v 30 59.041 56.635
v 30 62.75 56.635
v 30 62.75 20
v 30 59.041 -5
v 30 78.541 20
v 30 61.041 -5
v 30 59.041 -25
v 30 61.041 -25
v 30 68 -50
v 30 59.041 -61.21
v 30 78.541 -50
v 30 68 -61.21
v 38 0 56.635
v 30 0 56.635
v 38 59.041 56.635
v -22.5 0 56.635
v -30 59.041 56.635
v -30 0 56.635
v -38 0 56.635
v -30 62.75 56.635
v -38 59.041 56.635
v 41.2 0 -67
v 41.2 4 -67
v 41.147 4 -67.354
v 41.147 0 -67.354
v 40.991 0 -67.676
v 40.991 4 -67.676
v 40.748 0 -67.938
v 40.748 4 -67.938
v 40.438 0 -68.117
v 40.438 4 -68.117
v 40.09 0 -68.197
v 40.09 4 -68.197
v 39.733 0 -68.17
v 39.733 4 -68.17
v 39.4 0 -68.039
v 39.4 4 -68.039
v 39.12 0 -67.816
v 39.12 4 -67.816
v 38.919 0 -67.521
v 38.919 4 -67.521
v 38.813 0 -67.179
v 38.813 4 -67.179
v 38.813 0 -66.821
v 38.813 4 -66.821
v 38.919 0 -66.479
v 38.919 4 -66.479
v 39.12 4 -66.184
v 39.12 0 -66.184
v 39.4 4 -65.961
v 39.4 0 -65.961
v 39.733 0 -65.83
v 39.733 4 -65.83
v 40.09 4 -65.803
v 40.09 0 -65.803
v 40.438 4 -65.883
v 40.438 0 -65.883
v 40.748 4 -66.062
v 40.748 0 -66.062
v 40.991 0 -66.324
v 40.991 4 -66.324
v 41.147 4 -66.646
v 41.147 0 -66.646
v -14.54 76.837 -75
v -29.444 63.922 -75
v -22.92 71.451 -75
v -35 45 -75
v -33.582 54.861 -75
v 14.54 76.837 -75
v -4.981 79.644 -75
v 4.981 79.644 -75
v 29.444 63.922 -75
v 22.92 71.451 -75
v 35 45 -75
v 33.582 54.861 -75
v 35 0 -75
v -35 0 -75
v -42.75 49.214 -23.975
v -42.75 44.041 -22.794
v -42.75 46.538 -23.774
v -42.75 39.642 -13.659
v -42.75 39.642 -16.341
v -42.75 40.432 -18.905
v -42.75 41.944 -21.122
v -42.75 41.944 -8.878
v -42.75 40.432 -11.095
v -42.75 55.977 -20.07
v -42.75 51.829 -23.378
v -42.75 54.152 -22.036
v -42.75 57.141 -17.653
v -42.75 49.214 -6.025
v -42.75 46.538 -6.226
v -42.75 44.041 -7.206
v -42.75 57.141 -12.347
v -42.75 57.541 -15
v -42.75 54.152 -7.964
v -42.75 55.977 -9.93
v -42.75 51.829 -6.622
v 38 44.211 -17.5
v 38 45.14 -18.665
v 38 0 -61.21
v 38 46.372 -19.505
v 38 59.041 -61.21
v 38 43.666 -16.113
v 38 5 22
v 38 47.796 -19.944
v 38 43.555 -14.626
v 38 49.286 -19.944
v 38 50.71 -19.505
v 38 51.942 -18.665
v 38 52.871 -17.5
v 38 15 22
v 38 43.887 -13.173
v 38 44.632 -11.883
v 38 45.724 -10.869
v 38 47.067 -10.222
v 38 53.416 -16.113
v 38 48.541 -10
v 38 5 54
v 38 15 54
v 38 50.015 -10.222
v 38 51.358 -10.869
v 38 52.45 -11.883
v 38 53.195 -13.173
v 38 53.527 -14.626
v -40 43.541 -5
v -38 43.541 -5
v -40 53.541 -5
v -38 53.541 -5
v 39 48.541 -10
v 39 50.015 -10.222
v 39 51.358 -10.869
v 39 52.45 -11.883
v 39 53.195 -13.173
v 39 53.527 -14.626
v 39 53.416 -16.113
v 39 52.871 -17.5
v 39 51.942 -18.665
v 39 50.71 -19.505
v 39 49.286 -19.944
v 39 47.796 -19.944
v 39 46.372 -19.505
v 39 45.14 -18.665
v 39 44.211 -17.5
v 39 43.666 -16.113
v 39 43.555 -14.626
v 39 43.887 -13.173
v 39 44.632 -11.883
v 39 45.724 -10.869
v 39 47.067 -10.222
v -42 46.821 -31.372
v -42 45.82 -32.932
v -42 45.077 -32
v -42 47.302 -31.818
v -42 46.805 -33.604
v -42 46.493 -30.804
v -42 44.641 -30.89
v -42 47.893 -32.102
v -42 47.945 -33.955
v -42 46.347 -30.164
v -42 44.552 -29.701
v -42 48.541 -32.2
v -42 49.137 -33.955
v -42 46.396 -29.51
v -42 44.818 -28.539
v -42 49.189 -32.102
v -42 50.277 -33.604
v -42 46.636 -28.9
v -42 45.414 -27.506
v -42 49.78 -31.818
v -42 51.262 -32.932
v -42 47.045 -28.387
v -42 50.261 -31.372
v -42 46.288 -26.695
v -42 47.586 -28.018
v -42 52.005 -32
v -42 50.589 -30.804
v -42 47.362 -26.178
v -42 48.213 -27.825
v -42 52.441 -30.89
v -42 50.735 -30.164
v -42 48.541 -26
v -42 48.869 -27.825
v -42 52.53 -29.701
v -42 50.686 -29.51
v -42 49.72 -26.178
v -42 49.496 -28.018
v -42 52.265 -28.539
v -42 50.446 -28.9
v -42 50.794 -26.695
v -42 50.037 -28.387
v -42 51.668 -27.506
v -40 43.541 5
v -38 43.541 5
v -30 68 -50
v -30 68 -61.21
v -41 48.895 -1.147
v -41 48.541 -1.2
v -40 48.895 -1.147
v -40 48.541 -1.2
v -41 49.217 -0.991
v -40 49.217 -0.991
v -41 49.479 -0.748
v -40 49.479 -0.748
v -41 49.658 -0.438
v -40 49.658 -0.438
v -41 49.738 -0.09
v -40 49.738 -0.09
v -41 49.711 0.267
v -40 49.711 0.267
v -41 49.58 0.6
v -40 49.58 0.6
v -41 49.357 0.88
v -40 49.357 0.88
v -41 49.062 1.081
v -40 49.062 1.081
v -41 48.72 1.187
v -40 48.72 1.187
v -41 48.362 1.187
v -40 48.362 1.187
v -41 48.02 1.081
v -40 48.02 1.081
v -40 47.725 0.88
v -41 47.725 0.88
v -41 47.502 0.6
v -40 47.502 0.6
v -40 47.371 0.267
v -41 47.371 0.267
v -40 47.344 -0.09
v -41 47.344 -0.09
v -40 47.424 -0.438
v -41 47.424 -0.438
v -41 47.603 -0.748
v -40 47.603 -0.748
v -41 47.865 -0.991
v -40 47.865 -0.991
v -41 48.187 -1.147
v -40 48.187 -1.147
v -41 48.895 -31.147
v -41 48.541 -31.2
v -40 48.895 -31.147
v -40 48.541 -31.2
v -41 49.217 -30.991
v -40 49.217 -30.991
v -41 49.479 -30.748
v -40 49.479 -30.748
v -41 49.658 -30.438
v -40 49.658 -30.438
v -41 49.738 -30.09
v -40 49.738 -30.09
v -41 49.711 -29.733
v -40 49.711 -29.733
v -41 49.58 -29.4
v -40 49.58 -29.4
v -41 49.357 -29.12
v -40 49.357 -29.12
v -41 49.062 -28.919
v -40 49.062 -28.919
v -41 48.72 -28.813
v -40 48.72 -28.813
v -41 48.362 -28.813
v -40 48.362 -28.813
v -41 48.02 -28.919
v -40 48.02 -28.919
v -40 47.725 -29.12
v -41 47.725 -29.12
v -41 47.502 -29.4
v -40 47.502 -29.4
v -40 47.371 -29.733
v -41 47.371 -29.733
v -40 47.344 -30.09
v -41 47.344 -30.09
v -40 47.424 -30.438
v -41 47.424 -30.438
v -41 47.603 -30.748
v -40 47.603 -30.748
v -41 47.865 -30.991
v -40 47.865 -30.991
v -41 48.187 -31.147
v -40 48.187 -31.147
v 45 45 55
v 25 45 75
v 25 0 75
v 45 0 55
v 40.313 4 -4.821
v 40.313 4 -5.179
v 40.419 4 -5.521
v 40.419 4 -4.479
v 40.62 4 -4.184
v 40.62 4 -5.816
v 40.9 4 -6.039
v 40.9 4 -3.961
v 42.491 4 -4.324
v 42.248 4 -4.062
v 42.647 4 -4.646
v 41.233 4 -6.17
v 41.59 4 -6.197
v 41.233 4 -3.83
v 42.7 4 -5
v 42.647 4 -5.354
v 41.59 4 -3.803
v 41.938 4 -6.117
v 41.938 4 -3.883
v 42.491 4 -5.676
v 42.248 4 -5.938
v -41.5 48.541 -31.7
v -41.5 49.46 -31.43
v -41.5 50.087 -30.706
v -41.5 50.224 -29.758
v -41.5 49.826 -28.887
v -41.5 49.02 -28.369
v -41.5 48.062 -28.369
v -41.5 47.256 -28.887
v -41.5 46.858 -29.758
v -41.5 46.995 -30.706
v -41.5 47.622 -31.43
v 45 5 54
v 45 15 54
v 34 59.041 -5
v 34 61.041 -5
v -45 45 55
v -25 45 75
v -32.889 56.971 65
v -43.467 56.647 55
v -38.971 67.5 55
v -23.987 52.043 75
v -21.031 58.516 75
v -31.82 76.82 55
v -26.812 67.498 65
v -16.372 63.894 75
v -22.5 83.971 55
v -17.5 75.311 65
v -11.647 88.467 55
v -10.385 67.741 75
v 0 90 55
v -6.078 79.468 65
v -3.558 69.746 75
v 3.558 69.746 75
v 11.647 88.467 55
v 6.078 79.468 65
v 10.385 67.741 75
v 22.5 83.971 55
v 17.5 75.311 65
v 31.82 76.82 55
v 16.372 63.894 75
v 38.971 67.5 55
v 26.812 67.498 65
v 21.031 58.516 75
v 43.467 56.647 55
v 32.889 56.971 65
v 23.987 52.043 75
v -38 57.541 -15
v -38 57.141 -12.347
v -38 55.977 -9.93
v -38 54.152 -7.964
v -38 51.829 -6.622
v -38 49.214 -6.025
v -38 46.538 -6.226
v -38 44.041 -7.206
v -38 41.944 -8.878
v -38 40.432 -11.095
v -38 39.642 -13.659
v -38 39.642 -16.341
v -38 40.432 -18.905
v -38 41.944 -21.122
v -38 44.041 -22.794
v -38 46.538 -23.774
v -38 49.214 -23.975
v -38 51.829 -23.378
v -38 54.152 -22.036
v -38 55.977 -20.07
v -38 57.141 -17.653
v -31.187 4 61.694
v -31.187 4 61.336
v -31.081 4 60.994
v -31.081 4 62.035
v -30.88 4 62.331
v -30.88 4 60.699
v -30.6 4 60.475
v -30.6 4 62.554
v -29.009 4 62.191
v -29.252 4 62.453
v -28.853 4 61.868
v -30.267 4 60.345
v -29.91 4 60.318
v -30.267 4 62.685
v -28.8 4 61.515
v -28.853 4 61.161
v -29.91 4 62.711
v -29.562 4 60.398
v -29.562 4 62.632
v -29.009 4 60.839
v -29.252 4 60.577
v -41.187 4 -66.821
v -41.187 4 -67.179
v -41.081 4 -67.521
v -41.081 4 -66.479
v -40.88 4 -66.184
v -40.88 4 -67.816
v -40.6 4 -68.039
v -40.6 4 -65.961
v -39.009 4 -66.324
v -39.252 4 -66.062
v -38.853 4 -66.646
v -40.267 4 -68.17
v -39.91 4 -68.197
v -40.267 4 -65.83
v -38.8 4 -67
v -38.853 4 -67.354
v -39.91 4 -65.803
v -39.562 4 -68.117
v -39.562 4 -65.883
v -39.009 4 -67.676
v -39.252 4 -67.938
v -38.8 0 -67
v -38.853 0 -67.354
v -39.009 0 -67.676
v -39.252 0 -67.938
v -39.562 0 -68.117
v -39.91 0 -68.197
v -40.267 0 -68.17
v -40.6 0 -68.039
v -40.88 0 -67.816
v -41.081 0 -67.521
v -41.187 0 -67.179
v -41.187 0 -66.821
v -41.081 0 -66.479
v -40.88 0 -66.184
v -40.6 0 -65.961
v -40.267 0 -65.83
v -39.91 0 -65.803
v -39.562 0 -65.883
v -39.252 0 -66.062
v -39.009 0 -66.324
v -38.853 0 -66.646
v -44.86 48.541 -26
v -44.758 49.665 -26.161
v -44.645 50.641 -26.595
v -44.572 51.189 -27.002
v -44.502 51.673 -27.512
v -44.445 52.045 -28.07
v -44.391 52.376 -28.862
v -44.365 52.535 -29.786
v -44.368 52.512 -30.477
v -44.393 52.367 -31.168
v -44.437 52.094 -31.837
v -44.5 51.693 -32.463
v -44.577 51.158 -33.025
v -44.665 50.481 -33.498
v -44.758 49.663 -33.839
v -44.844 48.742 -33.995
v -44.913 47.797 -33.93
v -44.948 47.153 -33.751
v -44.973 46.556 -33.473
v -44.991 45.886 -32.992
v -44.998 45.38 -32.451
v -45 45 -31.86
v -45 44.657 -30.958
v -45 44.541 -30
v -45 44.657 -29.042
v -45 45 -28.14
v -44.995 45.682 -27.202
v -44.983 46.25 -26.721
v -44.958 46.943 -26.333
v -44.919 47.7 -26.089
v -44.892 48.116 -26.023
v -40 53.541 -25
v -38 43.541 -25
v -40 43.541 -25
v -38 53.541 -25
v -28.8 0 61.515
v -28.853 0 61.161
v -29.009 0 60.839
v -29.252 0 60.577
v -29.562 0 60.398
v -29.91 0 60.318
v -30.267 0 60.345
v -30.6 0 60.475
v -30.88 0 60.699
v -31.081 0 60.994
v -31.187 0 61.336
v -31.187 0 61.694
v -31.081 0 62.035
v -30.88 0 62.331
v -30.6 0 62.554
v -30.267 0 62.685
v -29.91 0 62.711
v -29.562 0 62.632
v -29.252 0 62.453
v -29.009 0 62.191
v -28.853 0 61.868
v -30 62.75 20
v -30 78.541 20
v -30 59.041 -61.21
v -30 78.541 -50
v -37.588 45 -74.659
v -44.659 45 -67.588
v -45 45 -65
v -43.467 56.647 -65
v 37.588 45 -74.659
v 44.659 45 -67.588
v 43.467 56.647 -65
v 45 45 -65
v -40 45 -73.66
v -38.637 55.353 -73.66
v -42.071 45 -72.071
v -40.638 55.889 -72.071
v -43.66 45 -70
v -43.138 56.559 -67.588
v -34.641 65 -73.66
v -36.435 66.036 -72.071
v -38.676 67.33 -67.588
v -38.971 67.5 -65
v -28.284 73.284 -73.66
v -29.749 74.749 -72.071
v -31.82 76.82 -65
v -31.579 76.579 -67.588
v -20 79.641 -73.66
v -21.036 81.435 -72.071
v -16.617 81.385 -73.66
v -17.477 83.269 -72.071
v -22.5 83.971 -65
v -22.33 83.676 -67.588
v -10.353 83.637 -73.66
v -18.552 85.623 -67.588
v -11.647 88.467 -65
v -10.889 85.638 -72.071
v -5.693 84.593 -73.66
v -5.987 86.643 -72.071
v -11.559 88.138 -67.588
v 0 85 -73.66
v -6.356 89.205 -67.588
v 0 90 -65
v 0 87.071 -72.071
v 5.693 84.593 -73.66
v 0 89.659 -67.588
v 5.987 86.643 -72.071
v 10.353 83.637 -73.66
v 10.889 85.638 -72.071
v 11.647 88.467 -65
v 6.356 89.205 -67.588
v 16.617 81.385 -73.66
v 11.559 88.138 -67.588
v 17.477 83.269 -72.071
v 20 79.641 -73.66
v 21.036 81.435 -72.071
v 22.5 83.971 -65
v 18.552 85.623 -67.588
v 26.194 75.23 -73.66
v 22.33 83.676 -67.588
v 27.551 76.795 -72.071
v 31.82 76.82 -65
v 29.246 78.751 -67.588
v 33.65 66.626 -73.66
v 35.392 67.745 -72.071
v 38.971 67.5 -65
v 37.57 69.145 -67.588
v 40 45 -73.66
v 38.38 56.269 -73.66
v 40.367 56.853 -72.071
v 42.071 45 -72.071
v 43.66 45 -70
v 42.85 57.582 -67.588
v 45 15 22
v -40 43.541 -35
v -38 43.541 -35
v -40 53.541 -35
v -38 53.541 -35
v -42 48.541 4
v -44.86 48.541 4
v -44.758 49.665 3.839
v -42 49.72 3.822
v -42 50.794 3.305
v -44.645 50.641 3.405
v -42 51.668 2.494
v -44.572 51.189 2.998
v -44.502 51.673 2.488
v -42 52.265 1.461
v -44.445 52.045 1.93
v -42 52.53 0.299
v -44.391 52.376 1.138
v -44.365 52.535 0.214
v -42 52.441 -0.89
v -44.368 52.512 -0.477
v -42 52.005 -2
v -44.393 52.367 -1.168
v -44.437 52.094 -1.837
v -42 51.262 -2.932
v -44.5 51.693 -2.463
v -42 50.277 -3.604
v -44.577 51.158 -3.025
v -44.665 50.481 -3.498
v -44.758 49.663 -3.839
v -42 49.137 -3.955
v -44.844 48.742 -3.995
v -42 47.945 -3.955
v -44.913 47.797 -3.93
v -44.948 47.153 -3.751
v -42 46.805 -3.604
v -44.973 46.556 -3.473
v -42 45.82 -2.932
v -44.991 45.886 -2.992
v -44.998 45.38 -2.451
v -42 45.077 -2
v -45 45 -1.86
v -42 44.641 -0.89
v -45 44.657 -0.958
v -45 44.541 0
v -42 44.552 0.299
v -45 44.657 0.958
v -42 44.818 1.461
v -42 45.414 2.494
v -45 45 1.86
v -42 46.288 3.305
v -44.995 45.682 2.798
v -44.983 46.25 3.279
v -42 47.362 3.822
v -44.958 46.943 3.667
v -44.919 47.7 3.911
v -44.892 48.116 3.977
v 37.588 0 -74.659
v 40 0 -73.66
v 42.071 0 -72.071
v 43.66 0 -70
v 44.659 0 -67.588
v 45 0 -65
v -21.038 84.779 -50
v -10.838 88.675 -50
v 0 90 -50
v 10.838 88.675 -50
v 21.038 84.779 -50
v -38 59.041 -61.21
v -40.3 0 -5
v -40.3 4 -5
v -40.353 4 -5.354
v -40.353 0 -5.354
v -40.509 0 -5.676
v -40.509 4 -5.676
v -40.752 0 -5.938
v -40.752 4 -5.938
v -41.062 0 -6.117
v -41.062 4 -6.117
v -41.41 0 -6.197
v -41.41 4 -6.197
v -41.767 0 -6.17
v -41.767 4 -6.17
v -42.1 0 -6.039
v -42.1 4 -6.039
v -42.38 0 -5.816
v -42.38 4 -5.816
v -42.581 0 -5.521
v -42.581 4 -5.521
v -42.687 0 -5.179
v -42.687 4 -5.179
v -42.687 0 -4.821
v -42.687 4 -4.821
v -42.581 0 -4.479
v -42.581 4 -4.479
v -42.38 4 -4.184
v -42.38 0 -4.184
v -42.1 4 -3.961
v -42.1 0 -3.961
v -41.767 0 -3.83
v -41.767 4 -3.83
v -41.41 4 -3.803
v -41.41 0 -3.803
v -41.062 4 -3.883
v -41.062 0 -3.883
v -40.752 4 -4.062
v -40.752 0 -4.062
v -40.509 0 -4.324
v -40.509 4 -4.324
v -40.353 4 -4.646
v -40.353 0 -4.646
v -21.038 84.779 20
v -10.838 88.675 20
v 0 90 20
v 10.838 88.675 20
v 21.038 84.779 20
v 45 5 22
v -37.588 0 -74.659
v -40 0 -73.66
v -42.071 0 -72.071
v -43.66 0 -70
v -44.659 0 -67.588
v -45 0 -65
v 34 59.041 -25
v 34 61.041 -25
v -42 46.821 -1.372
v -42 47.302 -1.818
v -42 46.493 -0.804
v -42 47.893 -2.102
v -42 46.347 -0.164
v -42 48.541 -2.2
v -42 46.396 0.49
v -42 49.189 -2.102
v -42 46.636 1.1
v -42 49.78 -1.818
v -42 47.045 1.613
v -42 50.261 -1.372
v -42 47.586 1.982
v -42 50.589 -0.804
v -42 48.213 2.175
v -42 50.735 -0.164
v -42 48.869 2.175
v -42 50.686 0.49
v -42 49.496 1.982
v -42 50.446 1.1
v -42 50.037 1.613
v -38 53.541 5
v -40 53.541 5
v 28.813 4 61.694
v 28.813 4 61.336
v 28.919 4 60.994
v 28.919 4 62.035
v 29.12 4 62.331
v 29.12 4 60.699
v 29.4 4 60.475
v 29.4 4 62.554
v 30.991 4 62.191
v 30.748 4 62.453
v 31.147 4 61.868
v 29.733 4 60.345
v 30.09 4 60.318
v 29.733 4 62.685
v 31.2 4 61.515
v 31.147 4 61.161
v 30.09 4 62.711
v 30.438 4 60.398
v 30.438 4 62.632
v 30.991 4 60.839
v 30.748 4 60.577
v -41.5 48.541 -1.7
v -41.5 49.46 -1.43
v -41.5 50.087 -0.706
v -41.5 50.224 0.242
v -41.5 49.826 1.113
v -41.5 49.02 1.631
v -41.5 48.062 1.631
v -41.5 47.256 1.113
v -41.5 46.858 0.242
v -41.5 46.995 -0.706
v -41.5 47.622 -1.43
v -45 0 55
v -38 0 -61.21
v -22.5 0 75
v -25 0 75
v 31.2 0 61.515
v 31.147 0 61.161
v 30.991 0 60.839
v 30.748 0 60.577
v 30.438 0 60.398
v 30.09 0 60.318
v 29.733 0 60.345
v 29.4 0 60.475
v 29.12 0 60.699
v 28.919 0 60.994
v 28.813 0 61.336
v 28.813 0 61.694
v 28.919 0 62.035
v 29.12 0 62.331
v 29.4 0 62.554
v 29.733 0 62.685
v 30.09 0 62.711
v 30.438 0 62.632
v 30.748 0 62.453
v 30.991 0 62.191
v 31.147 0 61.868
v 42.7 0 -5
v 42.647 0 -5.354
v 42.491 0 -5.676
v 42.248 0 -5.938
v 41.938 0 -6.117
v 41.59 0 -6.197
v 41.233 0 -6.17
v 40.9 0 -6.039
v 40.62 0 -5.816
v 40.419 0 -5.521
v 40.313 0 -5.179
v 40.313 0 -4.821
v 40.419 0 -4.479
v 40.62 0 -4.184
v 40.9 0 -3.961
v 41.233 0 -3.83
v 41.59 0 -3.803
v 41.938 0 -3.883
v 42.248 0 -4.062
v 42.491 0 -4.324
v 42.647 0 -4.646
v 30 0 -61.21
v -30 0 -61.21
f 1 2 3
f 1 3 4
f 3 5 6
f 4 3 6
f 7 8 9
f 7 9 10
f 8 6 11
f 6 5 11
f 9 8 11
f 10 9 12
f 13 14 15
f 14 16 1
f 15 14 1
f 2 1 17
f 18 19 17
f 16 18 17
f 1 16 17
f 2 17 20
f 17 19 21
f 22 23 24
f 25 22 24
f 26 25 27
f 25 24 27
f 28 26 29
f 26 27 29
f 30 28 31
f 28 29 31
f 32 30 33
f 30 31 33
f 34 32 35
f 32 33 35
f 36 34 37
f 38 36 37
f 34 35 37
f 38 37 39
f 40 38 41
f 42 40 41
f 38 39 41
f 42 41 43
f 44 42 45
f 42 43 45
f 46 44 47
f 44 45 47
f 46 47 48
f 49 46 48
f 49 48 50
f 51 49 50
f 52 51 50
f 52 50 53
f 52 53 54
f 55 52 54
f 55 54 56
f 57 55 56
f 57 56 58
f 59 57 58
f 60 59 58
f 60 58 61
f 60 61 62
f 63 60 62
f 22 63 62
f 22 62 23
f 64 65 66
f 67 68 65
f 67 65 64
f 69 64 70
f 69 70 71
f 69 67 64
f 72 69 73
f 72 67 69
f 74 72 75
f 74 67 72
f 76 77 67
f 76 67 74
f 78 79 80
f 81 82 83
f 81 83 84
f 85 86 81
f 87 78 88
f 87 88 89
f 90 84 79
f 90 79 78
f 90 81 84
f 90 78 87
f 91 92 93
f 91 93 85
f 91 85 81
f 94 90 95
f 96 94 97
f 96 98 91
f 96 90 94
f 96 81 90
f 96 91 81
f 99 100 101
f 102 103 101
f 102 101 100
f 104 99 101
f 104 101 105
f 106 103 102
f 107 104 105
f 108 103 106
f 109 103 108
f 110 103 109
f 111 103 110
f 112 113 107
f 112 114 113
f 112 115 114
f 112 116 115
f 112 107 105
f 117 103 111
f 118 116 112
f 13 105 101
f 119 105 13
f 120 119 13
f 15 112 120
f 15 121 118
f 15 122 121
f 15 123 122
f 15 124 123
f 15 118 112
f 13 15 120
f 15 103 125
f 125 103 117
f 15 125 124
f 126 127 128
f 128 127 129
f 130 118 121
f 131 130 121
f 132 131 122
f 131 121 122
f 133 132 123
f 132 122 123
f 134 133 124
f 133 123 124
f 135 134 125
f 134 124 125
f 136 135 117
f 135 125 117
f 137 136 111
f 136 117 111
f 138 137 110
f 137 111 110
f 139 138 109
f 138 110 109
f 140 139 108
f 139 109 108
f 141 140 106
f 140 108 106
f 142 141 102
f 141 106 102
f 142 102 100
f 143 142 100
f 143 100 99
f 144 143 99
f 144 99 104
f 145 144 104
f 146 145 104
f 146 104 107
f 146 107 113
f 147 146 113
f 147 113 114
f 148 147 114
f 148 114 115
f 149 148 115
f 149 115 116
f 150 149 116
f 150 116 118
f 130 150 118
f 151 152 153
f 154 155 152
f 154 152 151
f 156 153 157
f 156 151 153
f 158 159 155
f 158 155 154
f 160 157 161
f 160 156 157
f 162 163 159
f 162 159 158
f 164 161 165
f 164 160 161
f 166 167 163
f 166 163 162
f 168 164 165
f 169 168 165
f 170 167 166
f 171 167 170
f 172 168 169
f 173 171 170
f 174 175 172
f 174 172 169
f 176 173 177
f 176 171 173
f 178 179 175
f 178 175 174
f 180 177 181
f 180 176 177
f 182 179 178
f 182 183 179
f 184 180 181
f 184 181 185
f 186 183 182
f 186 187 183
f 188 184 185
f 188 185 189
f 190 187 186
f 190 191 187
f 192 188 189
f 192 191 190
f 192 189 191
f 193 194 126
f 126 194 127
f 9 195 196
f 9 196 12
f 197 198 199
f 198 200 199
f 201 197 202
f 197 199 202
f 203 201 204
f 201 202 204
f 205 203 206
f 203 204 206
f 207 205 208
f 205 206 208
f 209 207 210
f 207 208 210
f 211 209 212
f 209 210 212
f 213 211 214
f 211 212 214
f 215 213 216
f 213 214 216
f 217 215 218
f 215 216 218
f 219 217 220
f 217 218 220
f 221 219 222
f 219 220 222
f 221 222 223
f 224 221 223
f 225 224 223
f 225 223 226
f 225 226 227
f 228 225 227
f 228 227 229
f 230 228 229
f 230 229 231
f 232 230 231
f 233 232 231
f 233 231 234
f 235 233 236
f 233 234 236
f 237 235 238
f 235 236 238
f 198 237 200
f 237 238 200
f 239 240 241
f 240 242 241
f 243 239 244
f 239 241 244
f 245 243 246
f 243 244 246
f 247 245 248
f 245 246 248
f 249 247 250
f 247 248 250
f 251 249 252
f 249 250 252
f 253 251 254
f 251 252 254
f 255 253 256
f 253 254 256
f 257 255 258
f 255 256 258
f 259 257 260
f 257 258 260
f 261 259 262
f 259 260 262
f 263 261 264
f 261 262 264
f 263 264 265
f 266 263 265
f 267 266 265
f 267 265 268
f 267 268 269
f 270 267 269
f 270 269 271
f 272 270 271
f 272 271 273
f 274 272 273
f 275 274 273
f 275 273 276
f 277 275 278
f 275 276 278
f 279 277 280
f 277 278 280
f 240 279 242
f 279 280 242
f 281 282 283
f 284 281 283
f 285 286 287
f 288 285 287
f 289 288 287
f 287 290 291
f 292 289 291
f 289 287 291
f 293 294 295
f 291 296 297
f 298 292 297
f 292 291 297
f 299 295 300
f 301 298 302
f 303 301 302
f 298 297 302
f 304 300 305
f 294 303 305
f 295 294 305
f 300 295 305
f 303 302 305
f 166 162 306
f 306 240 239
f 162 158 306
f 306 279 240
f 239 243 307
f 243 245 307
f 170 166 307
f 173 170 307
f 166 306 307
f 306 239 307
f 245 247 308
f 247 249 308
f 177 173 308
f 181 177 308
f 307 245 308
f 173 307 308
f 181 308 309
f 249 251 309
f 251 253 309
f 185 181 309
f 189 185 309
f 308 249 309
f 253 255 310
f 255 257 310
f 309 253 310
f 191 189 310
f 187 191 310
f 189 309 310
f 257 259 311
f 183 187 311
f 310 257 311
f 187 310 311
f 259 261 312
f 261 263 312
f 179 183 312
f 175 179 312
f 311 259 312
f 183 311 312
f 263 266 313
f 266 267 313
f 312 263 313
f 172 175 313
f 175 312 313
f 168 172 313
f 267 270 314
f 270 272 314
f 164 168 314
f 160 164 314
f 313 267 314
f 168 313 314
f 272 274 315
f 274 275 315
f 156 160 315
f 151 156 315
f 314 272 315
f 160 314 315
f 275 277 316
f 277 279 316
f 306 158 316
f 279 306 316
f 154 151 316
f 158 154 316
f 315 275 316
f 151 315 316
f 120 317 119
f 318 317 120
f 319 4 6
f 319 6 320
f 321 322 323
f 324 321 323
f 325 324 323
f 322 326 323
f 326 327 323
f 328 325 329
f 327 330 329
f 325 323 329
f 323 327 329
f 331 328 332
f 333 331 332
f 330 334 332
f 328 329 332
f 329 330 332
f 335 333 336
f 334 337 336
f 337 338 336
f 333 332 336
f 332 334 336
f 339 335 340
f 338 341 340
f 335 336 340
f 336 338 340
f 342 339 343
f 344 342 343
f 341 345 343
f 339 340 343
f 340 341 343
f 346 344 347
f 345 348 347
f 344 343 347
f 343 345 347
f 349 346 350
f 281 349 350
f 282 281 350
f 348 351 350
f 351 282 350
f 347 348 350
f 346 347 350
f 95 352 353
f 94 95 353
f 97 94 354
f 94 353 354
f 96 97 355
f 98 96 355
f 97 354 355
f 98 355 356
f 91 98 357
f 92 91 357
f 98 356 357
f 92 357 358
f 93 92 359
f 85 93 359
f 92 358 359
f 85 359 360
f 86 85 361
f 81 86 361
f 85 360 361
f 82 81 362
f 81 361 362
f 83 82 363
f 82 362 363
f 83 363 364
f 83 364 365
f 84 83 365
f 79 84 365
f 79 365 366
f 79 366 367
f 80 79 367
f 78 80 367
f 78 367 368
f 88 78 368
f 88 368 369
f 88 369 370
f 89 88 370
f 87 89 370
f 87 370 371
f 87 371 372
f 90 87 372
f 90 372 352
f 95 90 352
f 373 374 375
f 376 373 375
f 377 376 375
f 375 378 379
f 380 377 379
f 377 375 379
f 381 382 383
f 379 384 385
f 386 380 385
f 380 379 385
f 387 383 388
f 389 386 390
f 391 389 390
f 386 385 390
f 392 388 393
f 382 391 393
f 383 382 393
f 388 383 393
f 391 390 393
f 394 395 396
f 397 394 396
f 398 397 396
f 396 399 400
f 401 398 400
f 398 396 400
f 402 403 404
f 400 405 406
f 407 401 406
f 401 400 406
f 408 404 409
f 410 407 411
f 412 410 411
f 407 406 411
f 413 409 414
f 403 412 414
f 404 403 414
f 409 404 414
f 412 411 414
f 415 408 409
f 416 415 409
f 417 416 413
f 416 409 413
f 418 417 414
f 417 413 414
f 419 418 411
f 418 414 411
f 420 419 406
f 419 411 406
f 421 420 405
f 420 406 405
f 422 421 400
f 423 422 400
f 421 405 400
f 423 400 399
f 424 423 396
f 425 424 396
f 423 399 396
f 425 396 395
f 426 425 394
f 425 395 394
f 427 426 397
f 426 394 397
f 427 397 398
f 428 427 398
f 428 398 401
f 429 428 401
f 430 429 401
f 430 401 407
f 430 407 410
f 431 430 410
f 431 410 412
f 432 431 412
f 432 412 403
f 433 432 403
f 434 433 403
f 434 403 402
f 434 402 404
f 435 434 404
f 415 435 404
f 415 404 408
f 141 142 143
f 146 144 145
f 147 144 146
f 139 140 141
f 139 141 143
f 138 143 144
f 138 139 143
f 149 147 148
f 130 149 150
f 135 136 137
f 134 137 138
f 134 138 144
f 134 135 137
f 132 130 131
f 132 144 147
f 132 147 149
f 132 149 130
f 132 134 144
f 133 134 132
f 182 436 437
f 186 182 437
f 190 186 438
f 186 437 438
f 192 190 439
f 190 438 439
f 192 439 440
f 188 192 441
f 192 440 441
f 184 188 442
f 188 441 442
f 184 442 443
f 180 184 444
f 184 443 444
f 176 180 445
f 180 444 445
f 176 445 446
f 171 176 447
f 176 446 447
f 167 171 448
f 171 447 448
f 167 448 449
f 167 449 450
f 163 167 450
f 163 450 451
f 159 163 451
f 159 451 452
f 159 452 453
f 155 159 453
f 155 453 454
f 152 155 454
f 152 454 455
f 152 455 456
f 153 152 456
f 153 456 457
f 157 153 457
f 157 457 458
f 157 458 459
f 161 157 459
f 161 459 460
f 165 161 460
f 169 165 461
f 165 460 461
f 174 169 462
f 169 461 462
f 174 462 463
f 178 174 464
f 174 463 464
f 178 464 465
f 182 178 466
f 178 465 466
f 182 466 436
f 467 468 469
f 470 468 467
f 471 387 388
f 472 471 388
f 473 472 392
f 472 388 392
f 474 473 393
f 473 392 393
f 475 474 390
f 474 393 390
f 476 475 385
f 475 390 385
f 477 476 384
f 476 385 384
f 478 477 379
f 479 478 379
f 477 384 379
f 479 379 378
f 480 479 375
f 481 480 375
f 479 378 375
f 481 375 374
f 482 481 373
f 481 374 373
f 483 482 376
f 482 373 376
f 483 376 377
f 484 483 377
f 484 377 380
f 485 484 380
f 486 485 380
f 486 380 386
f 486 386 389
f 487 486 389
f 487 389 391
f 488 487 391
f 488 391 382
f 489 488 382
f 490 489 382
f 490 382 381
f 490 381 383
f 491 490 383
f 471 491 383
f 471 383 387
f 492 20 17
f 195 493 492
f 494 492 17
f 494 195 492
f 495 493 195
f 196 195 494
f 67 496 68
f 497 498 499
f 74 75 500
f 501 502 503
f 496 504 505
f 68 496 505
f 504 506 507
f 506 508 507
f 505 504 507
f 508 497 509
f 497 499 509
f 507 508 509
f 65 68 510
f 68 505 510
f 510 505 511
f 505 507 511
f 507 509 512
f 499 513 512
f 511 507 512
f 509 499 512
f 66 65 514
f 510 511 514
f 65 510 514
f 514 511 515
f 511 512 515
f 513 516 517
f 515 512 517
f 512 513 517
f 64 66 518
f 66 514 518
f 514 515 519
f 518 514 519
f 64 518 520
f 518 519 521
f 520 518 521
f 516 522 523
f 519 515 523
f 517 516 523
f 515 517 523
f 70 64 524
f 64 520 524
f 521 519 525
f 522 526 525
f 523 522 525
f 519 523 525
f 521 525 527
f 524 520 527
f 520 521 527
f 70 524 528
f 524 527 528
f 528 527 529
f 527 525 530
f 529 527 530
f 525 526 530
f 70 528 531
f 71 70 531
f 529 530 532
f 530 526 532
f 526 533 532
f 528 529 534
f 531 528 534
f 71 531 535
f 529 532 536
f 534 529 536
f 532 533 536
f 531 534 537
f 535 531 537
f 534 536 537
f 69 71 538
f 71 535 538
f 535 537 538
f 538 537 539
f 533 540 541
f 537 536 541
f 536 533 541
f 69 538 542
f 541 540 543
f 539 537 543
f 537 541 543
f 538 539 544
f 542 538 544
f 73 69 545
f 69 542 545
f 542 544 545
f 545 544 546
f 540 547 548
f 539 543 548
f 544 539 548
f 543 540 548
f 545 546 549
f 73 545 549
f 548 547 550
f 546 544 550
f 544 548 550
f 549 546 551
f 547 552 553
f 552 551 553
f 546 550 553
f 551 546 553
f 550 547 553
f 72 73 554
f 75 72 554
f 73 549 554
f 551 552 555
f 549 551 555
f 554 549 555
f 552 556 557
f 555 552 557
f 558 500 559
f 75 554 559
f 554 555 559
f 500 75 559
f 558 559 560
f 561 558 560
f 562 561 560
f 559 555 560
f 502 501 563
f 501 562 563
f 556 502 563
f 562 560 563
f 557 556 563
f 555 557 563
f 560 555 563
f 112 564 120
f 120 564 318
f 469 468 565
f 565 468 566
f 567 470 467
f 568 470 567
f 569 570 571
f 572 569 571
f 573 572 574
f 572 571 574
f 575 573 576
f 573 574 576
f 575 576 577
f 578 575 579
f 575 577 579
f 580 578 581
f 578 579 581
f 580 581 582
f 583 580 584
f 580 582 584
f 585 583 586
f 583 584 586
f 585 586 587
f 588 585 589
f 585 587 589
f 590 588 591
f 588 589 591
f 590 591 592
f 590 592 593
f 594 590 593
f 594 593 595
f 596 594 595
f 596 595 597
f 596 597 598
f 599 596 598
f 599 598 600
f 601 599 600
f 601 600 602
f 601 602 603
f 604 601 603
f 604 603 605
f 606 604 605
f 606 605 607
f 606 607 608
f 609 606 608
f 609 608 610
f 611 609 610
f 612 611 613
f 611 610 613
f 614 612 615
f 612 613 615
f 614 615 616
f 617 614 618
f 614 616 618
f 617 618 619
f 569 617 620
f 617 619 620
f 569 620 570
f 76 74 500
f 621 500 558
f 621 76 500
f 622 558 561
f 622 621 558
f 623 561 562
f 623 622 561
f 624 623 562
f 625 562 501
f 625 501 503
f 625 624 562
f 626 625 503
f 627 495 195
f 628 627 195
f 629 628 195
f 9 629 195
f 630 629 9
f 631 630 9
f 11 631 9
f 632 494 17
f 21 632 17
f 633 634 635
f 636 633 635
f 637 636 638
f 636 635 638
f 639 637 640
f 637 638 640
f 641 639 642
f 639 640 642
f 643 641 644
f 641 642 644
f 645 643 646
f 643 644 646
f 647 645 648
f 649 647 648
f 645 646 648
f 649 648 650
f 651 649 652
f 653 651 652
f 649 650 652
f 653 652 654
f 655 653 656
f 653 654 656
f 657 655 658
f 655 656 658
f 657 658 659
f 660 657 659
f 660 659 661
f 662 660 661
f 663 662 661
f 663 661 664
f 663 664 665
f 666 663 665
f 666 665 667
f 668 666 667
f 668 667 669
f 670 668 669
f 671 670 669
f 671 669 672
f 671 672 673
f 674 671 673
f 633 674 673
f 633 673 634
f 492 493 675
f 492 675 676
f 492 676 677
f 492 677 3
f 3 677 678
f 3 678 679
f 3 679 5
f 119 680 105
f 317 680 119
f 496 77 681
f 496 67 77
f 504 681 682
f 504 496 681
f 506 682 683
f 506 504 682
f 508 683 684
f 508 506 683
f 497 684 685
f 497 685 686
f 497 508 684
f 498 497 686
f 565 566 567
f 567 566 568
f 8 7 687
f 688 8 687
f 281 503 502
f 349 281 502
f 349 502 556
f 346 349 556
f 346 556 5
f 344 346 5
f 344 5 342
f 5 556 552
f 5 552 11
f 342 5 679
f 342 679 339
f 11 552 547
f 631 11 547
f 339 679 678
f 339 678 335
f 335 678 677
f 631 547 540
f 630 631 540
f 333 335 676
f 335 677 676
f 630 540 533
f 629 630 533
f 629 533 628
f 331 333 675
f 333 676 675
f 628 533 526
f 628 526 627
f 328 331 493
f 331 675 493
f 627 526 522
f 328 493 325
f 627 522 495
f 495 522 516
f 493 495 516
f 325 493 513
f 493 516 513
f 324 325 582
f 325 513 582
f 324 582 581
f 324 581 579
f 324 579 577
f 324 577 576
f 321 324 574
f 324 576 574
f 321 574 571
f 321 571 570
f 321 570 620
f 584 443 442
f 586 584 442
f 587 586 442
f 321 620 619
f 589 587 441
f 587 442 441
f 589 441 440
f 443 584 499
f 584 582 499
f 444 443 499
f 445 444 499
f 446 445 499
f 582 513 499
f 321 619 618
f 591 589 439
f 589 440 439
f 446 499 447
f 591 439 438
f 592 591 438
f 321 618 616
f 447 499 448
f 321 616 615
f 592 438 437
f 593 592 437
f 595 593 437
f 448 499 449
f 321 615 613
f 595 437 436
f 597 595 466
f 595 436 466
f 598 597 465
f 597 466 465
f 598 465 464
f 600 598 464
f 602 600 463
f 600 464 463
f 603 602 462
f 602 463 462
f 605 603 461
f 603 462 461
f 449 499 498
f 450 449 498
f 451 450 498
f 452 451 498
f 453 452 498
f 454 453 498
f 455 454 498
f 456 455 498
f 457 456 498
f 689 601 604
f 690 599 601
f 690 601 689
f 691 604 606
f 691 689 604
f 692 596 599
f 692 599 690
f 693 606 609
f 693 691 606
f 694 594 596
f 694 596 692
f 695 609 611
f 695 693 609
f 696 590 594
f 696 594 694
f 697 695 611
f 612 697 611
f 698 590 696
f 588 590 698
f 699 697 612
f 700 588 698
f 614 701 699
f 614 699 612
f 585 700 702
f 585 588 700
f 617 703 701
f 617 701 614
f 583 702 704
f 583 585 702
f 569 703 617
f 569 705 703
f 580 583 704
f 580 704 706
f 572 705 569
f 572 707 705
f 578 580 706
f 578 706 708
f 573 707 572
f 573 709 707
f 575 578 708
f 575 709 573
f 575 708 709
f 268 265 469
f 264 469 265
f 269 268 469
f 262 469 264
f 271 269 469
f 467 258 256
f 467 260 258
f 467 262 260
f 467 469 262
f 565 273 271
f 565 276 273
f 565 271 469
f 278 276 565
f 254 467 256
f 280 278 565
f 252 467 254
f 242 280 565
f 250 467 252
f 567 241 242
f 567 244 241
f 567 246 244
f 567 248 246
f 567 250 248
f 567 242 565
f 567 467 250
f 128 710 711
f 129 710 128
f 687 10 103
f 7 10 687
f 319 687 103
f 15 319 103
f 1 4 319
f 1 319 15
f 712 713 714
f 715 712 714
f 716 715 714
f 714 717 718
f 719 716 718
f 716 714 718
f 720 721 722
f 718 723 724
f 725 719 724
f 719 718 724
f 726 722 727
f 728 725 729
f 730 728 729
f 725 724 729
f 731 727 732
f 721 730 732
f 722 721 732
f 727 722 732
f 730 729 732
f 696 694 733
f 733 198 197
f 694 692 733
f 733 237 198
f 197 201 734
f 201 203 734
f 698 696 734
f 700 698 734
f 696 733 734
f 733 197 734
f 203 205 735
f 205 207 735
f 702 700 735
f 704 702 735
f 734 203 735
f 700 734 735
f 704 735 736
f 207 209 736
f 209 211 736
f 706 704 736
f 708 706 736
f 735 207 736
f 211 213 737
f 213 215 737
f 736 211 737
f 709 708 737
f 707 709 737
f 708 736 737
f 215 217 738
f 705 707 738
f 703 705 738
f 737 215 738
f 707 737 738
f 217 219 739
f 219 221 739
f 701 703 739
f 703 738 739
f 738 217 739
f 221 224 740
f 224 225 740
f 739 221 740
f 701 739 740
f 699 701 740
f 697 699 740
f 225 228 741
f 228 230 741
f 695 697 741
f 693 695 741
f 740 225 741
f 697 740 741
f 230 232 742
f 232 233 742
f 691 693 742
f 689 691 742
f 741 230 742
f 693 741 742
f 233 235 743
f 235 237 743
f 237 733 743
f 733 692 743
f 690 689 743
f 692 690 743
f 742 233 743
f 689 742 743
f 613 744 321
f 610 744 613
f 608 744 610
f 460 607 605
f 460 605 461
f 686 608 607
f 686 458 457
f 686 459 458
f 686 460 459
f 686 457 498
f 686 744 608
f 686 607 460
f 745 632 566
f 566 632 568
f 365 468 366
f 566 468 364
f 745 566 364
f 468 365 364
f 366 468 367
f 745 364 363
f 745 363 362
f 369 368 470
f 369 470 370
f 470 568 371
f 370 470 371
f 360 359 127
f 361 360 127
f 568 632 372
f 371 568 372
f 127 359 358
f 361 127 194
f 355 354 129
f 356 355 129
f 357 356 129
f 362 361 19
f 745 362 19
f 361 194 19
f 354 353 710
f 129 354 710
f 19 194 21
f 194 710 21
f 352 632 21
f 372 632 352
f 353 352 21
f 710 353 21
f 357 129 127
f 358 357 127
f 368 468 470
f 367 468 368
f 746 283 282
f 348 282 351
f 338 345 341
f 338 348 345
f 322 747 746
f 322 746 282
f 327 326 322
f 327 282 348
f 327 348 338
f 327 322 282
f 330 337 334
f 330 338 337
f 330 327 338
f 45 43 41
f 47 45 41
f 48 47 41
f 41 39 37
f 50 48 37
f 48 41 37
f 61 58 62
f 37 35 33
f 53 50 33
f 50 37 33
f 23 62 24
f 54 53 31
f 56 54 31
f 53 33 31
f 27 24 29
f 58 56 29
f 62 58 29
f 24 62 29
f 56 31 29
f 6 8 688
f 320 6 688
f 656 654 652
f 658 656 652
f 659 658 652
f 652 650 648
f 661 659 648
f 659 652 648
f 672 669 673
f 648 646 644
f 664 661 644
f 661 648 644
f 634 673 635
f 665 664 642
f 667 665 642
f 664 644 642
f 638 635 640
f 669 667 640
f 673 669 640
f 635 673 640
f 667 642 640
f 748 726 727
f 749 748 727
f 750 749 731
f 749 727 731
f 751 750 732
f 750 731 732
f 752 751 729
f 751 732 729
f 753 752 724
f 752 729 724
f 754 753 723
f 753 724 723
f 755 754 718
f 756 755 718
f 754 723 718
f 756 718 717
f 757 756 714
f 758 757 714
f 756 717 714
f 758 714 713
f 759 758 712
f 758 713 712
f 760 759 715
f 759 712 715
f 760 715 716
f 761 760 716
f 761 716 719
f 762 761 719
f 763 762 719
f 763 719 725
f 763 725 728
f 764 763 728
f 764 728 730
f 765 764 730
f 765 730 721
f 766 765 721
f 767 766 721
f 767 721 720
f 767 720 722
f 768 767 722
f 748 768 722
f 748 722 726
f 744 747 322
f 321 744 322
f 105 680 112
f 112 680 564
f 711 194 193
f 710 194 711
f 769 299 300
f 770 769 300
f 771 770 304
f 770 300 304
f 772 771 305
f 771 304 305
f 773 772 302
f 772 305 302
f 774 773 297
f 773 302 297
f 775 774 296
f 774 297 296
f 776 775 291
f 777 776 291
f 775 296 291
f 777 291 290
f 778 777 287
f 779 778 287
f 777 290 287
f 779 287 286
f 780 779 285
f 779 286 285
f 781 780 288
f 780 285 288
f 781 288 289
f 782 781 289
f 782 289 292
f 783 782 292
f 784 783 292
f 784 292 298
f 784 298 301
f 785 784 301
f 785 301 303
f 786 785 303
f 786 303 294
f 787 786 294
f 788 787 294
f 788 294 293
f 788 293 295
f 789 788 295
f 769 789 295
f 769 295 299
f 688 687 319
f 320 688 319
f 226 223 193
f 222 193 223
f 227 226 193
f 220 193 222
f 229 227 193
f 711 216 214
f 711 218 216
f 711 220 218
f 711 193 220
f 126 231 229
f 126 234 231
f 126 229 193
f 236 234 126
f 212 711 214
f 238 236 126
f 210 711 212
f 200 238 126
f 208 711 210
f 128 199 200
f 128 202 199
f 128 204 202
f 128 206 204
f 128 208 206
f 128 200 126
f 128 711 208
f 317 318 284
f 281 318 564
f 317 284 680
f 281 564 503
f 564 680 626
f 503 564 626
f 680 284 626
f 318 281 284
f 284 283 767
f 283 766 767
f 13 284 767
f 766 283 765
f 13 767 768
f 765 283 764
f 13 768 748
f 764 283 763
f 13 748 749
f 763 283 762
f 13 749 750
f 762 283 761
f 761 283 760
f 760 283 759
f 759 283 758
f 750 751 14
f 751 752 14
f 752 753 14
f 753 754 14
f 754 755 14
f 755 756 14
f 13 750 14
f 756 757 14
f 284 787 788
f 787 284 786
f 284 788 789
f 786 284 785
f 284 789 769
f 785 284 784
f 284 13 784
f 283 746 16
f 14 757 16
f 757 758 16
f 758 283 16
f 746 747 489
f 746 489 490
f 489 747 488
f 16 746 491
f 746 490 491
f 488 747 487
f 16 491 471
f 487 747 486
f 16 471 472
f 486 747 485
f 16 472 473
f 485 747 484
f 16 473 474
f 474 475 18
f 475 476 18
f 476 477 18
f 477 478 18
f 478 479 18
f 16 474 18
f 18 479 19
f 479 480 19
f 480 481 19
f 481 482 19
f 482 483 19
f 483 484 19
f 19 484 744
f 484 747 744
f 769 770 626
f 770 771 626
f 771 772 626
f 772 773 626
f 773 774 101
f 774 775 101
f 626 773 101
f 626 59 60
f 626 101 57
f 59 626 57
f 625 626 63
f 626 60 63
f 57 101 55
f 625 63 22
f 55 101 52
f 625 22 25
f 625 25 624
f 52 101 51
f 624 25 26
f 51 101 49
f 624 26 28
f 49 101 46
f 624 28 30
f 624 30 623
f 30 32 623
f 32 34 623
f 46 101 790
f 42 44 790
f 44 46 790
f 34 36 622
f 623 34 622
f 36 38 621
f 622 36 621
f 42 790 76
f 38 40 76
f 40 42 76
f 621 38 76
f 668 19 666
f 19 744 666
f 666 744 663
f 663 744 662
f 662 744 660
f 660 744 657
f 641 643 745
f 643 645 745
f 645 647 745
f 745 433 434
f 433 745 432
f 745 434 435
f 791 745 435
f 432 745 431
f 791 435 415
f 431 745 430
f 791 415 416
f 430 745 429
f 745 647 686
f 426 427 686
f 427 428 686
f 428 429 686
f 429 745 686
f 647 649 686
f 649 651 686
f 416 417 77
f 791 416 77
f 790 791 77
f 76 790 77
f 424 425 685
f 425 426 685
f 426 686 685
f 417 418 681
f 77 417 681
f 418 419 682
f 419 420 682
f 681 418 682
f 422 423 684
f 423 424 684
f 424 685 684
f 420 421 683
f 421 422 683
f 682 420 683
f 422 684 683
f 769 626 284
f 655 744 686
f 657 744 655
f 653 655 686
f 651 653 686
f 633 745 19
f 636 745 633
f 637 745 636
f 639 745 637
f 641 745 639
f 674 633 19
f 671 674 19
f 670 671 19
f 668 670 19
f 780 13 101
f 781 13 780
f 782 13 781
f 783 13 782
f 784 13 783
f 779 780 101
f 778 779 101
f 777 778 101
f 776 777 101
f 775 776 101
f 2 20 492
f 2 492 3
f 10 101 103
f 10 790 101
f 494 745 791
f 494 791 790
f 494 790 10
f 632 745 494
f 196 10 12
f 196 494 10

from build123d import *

# Parameters (mm, degrees)
SCHIZZO1_W                             = 90
SCHIZZO1_H                             = 150
ESTRUSIONE_ESTRUSIONE1_DEPTH           = 90
SCHIZZO4_W                             = 60
SCHIZZO4_H                             = 70
TAGLIO_ESTRUSIONE2_DEPTH               = 90
RACCORDO5_R                            = 45
RACCORDO6_R                            = 45
SMUSSO2_SIZE                           = 20
SCHIZZO7_W                             = 50
SCHIZZO7_H                             = 44.753189799
ESTRUSIONE_ESTRUSIONE2_DEPTH           = 50
SMUSSO3_SIZE                           = 20
SMUSSO3_SIZE2                          = 34.641016151
RACCORDO7_R                            = 10
RACCORDO8_R                            = 10
SCHIZZO9_W                             = 50
SCHIZZO9_H                             = 50
ESTRUSIONE_ESTRUSIONE3_DEPTH           = 5
RACCORDO9_R                            = 10
SCHIZZO13_W                            = 45
SCHIZZO13_H                            = 38.415996799
TAGLIO_ESTRUSIONE3_DEPTH               = 79.978264331
SCHIZZO14_W                            = 117.844501366
SCHIZZO14_H                            = 59.041021869
TAGLIO_ESTRUSIONE4_DEPTH               = 8
SCHIZZO18_R                            = 5
TAGLIO_ESTRUSIONE5_DEPTH               = 9
SCHIZZO16_W                            = 4
SCHIZZO16_H                            = 20
TAGLIO_ESTRUSIONE7_DEPTH               = 2
SCHIZZO23_W                            = 76
SCHIZZO23_H                            = 117.844501366
TAGLIO_ESTRUSIONE8_DEPTH               = 38
FORO_PER_VITE_M2_2_D                   = 2.4
FORO_PER_VITE_M2_2_DEPTH               = 4
FORO_PER_VITE_M4_1_D                   = 4.5
FORO_PER_VITE_M4_1_DEPTH               = 10
SCHIZZO29_W                            = 60
SCHIZZO29_H                            = 11.209863528
TAGLIO_ESTRUSIONE9_DEPTH               = 30
SCHIZZO36_W                            = 46.07976418
SCHIZZO36_H                            = 28.262497783
TAGLIO_ESTRUSIONE12_DEPTH              = 28
ESTRUSIONE_ESTRUSIONE4_REACH           = 170.388
SCHIZZO38_R                            = 6
SCHIZZO38_R_2                          = 2.5
TAGLIO_ESTRUSIONE13_DEPTH              = 28
SCHIZZO39_R                            = 9
SCHIZZO39_W                            = 10
SCHIZZO39_H                            = 10
TAGLIO_ESTRUSIONE14_DEPTH              = 2
SCHIZZO40_W                            = 32
SCHIZZO40_H                            = 10
TAGLIO_ESTRUSIONE15_DEPTH              = 10
SCHIZZO42_R                            = 4
TAGLIO_ESTRUSIONE16_DEPTH              = 3
FORO_SVASATO_PER_VITE_M2_3_D           = 2.4
FORO_SVASATO_PER_VITE_M2_3_DEPTH       = 6
FORO_SVASATO_PER_VITE_M2_3_CSINK_D     = 4.4
FORO_SVASATO_PER_VITE_M2_3_CSINK_ANGLE = 90
FORO_SVASATO_PER_VITE_M2_3_TIP         = 0.721032743
SCHIZZO53_R                            = 9
TAGLIO_ESTRUSIONE19_DEPTH              = 2.75
SCHIZZO54_W                            = 60
SCHIZZO54_H                            = 36.634637838
TAGLIO_ESTRUSIONE20_DEPTH              = 24.75
SCHIZZO55_W                            = 50
SCHIZZO55_H                            = 69.198351347
TAGLIO_ESTRUSIONE21_DEPTH              = 66
SCHIZZO57_W                            = 18.365362162
SCHIZZO57_H                            = 38.415996799
ESTRUSIONE_ESTRUSIONE5_DEPTH           = 47
SCHIZZO58_W                            = 7
SCHIZZO58_H                            = 32
ESTRUSIONE_ESTRUSIONE6_DEPTH           = 11


with BuildPart() as part:
    # Schizzo1 → Estrusione-Estrusione1 (new body)
    with BuildSketch(Plane(origin=(0, 0, 0), x_dir=(1, 0, 0), z_dir=(0, 1, 0))):
        Rectangle(SCHIZZO1_W, SCHIZZO1_H)
    extrude(amount=ESTRUSIONE_ESTRUSIONE1_DEPTH)

    # Schizzo4 → Taglio-Estrusione2 (cut)
    with BuildSketch(Plane(origin=(0, 90, 0), x_dir=(1, 0, 0), z_dir=(0, 1, 0))):
        with Locations((0, 15)):
            Rectangle(SCHIZZO4_W, SCHIZZO4_H)
    extrude(amount=-TAGLIO_ESTRUSIONE2_DEPTH, mode=Mode.SUBTRACT)

    # Raccordo5
    # the kernel refuses this fillet: 45 mm, written as the material it takes off along each edge
    with BuildSketch(Plane(origin=(-45, 90, -187.5), x_dir=(0, -1, 0), z_dir=(0, 0, 1))) as raccordo5_piece_1:
        with BuildLine():
            CenterArc((RACCORDO5_R, RACCORDO5_R), RACCORDO5_R, 180, 90)
            Line((0, RACCORDO5_R), (0, 0))
            Line((0, 0), (RACCORDO5_R, 0))
        make_face()
    extrude(amount=375, mode=Mode.SUBTRACT)

    # Raccordo6
    # the kernel refuses this fillet: 45 mm, written as the material it takes off along each edge
    with BuildSketch(Plane(origin=(45, 90, 187.5), x_dir=(0, -1, 0), z_dir=(0, 0, -1))) as raccordo6_piece_1:
        with BuildLine():
            CenterArc((RACCORDO6_R, RACCORDO6_R), RACCORDO6_R, 180, 90)
            Line((0, RACCORDO6_R), (0, 0))
            Line((0, 0), (RACCORDO6_R, 0))
        make_face()
    extrude(amount=375, mode=Mode.SUBTRACT)

    # Smusso2
    smusso2_edges = [part.edges().sort_by_distance(p)[0] for p in [
        (-45, 22.5, 75),
        (0, 90, 75),
        (45, 22.5, 75),
        (0, 90, 75),
    ]]
    chamfer(smusso2_edges, length=SMUSSO2_SIZE)

    # Schizzo7 → Estrusione-Estrusione2 (add)
    with BuildSketch(Plane.XY.offset(75)):
        with Locations((0, 22.3765949)):
            Rectangle(SCHIZZO7_W, SCHIZZO7_H)
    extrude(amount=ESTRUSIONE_ESTRUSIONE2_DEPTH)

    # Smusso3
    smusso3_edges = [part.edges().sort_by_distance(p)[0] for p in [
        (0, 44.753189799, 125),
    ]]
    smusso3_side = [part.faces().sort_by_distance(p)[0] for p in [
        (0, 44.753189799, 100),
    ]]
    chamfer(smusso3_edges, length=SMUSSO3_SIZE, length2=SMUSSO3_SIZE2, reference=smusso3_side[0])

    # Raccordo7
    raccordo7_edges = [part.edges().sort_by_distance(p)[0] for p in [
        (0, 44.753189799, 105),
    ]]
    fillet(raccordo7_edges, radius=RACCORDO7_R)

    # Raccordo8
    raccordo8_edges = [part.edges().sort_by_distance(p)[0] for p in [
        (0, 10.112173648, 125),
    ]]
    fillet(raccordo8_edges, radius=RACCORDO8_R)

    # Schizzo9 → Estrusione-Estrusione3 (add)
    with BuildSketch(Plane.XZ):
        with Locations((0, 100)):
            Rectangle(SCHIZZO9_W, SCHIZZO9_H)
    extrude(amount=ESTRUSIONE_ESTRUSIONE3_DEPTH)

    # Raccordo9
    raccordo9_edges = [part.edges().sort_by_distance(p)[0] for p in [
        (-45, 22.5, -75),
        (0, 90, -75),
        (45, 22.5, -75),
        (0, 90, -75),
    ]]
    fillet(raccordo9_edges, radius=RACCORDO9_R)

    # Schizzo13 → Taglio-Estrusione3 (cut)
    with BuildSketch(Plane(origin=(0, 0, 20), x_dir=(-1, 0, 0), z_dir=(0, 0, -1))):
        with Locations((0, 19.2079984)):
            Rectangle(SCHIZZO13_W, SCHIZZO13_H)
    extrude(amount=-TAGLIO_ESTRUSIONE3_DEPTH, mode=Mode.SUBTRACT)

    # Schizzo14 → Taglio-Estrusione4 (cut)
    with BuildSketch(Plane.ZY.offset(-30)):
        with Locations((-2.287612845, 29.520510935)):
            Rectangle(SCHIZZO14_W, SCHIZZO14_H)
    taglio_estrusione4 = extrude(amount=-TAGLIO_ESTRUSIONE4_DEPTH, mode=Mode.SUBTRACT)

    # Specchia1: Taglio-Estrusione4 across plane
    add(taglio_estrusione4.mirror(Plane(origin=(0, 0, 0), x_dir=(0, 0, 1), z_dir=(1, 0, 0))), mode=Mode.SUBTRACT)

    # Schizzo18 → Taglio-Estrusione5 (cut)
    with BuildSketch(Plane.ZY.offset(-30)):
        with Locations((-15, 48.541019662)):
            Circle(SCHIZZO18_R)
    extrude(amount=-TAGLIO_ESTRUSIONE5_DEPTH, mode=Mode.SUBTRACT)

    # Schizzo16 → Taglio-Estrusione7 (cut)
    with BuildSketch(Plane.XZ.offset(-59.041021869)):
        with Locations((32, -15)):
            Rectangle(SCHIZZO16_W, SCHIZZO16_H)
    extrude(amount=-TAGLIO_ESTRUSIONE7_DEPTH, mode=Mode.SUBTRACT)

    # Schizzo23 → Taglio-Estrusione8 (cut)
    with BuildSketch(Plane.XZ):
        with Locations((0, -2.287612845)):
            Rectangle(SCHIZZO23_W, SCHIZZO23_H)
    extrude(amount=-TAGLIO_ESTRUSIONE8_DEPTH, mode=Mode.SUBTRACT)

    # Foro per Vite M2-2
    with Locations(Plane(origin=(0, 0, 0), x_dir=(-1, 0, 0), z_dir=(0, -1, 0))):
        with Locations((40, 67), (30, -61.514718626), (-30, -61.514718626), (-40, 67), (-41.5, 5), (41.5, 5)):
            Hole(FORO_PER_VITE_M2_2_D / 2, depth=FORO_PER_VITE_M2_2_DEPTH)

    # Foro per Vite M4-1
    with Locations(Plane(origin=(0, -5, 84.779580177), x_dir=(0, 0, -1), z_dir=(0, -1, 0))):
        with Locations((0, 0)):
            Hole(FORO_PER_VITE_M4_1_D / 2, depth=FORO_PER_VITE_M4_1_DEPTH)

    # Schizzo29 → Taglio-Estrusione9 (cut)
    with BuildSketch(Plane.XZ.offset(-38)):
        with Locations((0, -55.604931764)):
            Rectangle(SCHIZZO29_W, SCHIZZO29_H)
    extrude(amount=-TAGLIO_ESTRUSIONE9_DEPTH, mode=Mode.SUBTRACT)

    # Schizzo36 → Taglio-Estrusione12 (cut)
    with BuildSketch(Plane(origin=(0, 56.654631148, 98.128699633), x_dir=(1, 0, 0), z_dir=(0, 0.5000000000000012, 0.8660254037844378))):
        with Locations((0, -35.289606117)):
            Rectangle(SCHIZZO36_W, SCHIZZO36_H)
    extrude(amount=-TAGLIO_ESTRUSIONE12_DEPTH, mode=Mode.SUBTRACT)

    # Schizzo37 → Estrusione-Estrusione4 (add, up to next)
    with BuildSketch(Plane.ZY.offset(-23.03988209), mode=Mode.PRIVATE) as estrusione_estrusione4_sk1:
        Polygon((122.839127138, 13.854915234), (108.707878246, 38.330956288), (106.809101084, 37.234696782), (120.940349975, 12.758655728), align=None)
    estrusione_estrusione4_tool1 = extrude(estrusione_estrusione4_sk1.sketch, amount=ESTRUSIONE_ESTRUSIONE4_REACH, mode=Mode.PRIVATE) - part.part
    add(estrusione_estrusione4_tool1.solids().sort_by_distance((23.039882, 25.544806, 114.824114))[0])

    # Schizzo38 → Taglio-Estrusione13 (cut)
    with BuildSketch(Plane(origin=(0, 56.654631148, 98.128699633), x_dir=(1, 0, 0), z_dir=(0, 0.5000000000000013, 0.8660254037844379))):
        with Locations(Location((-12.5, -35.289606117, 0), (0, 0, 270))):
            Circle(SCHIZZO38_R)
        with Locations(Location((12.5, -35.289606117, 0), (0, 0, 270))):
            Circle(SCHIZZO38_R_2)
    extrude(amount=-TAGLIO_ESTRUSIONE13_DEPTH, mode=Mode.SUBTRACT)

    # Schizzo39 → Taglio-Estrusione14 (cut)
    with BuildSketch(Plane(origin=(-38, 0, 0), x_dir=(0, 0, -1), z_dir=(1, 0, 0))):
        with Locations(Location((15, 48.541019662, 0), (0, 0, 90))):
            Circle(SCHIZZO39_R)
        with Locations((0, 48.541019662)):
            Rectangle(SCHIZZO39_W, SCHIZZO39_H)
        with Locations((30, 48.541019662)):
            Rectangle(SCHIZZO39_W, SCHIZZO39_H)
    extrude(amount=-TAGLIO_ESTRUSIONE14_DEPTH, mode=Mode.SUBTRACT)

    # Schizzo40 → Taglio-Estrusione15 (cut)
    with BuildSketch(Plane.ZY.offset(45)):
        with Locations((38, 10)):
            Rectangle(SCHIZZO40_W, SCHIZZO40_H)
    taglio_estrusione15 = extrude(amount=-TAGLIO_ESTRUSIONE15_DEPTH, mode=Mode.SUBTRACT)

    # Schizzo42 → Taglio-Estrusione16 (cut)
    with BuildSketch(Plane.ZY.offset(45)):
        with Locations((-30, 48.541019662)):
            Circle(SCHIZZO42_R)
        with Locations((0, 48.541019662)):
            Circle(SCHIZZO42_R)
    extrude(amount=-TAGLIO_ESTRUSIONE16_DEPTH, mode=Mode.SUBTRACT)

    # Foro svasato per Vite M2-3
    with Locations(Plane.ZY.offset(42)):
        with Locations((-30, 48.541019662), (0, 48.541019662)):
            CounterSinkHole(FORO_SVASATO_PER_VITE_M2_3_D / 2, FORO_SVASATO_PER_VITE_M2_3_CSINK_D / 2, depth=FORO_SVASATO_PER_VITE_M2_3_DEPTH, counter_sink_angle=FORO_SVASATO_PER_VITE_M2_3_CSINK_ANGLE)
            with Locations((0, 0, -(FORO_SVASATO_PER_VITE_M2_3_DEPTH + FORO_SVASATO_PER_VITE_M2_3_TIP / 2))):  # 118° drill point
                Cone(0, FORO_SVASATO_PER_VITE_M2_3_D / 2, FORO_SVASATO_PER_VITE_M2_3_TIP, mode=Mode.SUBTRACT)

    # Schizzo53 → Taglio-Estrusione19 (cut)
    with BuildSketch(Plane(origin=(-40, 0, 0), x_dir=(0, 0, -1), z_dir=(1, 0, 0))):
        with Locations(Location((15, 48.541019662, 0), (0, 0, 90))):
            Circle(SCHIZZO53_R)
    extrude(amount=-TAGLIO_ESTRUSIONE19_DEPTH, mode=Mode.SUBTRACT)

    # Schizzo54 → Taglio-Estrusione20 (cut)
    with BuildSketch(Plane.XZ.offset(-38)):
        with Locations((0, 38.317318919)):
            Rectangle(SCHIZZO54_W, SCHIZZO54_H)
    extrude(amount=-TAGLIO_ESTRUSIONE20_DEPTH, mode=Mode.SUBTRACT)

    # Schizzo55 → Taglio-Estrusione21 (cut)
    with BuildSketch(Plane(origin=(0, 44.753189799, 0), x_dir=(1, 0, 0), z_dir=(0, 1, 0))):
        with Locations((0, -109.599175673)):
            Rectangle(SCHIZZO55_W, SCHIZZO55_H)
    extrude(amount=-TAGLIO_ESTRUSIONE21_DEPTH, mode=Mode.SUBTRACT)

    # Schizzo57 → Estrusione-Estrusione5 (add)
    with BuildSketch(Plane(origin=(-22.5, 0, 0), x_dir=(0, 0, -1), z_dir=(1, 0, 0))):
        with Locations((-65.817318919, 19.2079984)):
            Rectangle(SCHIZZO57_W, SCHIZZO57_H)
    extrude(amount=ESTRUSIONE_ESTRUSIONE5_DEPTH)

    # Specchia2: Taglio-Estrusione15 across plane
    add(taglio_estrusione15.mirror(Plane(origin=(0, 0, 0), x_dir=(0, 0, 1), z_dir=(1, 0, 0))), mode=Mode.SUBTRACT)

    # Schizzo58 → Estrusione-Estrusione6 (add)
    with BuildSketch(Plane.XZ.offset(-15)):
        with Locations((-41.5, 38)):
            Rectangle(SCHIZZO58_W, SCHIZZO58_H)
    extrude(amount=ESTRUSIONE_ESTRUSIONE6_DEPTH)


solid = part.part
